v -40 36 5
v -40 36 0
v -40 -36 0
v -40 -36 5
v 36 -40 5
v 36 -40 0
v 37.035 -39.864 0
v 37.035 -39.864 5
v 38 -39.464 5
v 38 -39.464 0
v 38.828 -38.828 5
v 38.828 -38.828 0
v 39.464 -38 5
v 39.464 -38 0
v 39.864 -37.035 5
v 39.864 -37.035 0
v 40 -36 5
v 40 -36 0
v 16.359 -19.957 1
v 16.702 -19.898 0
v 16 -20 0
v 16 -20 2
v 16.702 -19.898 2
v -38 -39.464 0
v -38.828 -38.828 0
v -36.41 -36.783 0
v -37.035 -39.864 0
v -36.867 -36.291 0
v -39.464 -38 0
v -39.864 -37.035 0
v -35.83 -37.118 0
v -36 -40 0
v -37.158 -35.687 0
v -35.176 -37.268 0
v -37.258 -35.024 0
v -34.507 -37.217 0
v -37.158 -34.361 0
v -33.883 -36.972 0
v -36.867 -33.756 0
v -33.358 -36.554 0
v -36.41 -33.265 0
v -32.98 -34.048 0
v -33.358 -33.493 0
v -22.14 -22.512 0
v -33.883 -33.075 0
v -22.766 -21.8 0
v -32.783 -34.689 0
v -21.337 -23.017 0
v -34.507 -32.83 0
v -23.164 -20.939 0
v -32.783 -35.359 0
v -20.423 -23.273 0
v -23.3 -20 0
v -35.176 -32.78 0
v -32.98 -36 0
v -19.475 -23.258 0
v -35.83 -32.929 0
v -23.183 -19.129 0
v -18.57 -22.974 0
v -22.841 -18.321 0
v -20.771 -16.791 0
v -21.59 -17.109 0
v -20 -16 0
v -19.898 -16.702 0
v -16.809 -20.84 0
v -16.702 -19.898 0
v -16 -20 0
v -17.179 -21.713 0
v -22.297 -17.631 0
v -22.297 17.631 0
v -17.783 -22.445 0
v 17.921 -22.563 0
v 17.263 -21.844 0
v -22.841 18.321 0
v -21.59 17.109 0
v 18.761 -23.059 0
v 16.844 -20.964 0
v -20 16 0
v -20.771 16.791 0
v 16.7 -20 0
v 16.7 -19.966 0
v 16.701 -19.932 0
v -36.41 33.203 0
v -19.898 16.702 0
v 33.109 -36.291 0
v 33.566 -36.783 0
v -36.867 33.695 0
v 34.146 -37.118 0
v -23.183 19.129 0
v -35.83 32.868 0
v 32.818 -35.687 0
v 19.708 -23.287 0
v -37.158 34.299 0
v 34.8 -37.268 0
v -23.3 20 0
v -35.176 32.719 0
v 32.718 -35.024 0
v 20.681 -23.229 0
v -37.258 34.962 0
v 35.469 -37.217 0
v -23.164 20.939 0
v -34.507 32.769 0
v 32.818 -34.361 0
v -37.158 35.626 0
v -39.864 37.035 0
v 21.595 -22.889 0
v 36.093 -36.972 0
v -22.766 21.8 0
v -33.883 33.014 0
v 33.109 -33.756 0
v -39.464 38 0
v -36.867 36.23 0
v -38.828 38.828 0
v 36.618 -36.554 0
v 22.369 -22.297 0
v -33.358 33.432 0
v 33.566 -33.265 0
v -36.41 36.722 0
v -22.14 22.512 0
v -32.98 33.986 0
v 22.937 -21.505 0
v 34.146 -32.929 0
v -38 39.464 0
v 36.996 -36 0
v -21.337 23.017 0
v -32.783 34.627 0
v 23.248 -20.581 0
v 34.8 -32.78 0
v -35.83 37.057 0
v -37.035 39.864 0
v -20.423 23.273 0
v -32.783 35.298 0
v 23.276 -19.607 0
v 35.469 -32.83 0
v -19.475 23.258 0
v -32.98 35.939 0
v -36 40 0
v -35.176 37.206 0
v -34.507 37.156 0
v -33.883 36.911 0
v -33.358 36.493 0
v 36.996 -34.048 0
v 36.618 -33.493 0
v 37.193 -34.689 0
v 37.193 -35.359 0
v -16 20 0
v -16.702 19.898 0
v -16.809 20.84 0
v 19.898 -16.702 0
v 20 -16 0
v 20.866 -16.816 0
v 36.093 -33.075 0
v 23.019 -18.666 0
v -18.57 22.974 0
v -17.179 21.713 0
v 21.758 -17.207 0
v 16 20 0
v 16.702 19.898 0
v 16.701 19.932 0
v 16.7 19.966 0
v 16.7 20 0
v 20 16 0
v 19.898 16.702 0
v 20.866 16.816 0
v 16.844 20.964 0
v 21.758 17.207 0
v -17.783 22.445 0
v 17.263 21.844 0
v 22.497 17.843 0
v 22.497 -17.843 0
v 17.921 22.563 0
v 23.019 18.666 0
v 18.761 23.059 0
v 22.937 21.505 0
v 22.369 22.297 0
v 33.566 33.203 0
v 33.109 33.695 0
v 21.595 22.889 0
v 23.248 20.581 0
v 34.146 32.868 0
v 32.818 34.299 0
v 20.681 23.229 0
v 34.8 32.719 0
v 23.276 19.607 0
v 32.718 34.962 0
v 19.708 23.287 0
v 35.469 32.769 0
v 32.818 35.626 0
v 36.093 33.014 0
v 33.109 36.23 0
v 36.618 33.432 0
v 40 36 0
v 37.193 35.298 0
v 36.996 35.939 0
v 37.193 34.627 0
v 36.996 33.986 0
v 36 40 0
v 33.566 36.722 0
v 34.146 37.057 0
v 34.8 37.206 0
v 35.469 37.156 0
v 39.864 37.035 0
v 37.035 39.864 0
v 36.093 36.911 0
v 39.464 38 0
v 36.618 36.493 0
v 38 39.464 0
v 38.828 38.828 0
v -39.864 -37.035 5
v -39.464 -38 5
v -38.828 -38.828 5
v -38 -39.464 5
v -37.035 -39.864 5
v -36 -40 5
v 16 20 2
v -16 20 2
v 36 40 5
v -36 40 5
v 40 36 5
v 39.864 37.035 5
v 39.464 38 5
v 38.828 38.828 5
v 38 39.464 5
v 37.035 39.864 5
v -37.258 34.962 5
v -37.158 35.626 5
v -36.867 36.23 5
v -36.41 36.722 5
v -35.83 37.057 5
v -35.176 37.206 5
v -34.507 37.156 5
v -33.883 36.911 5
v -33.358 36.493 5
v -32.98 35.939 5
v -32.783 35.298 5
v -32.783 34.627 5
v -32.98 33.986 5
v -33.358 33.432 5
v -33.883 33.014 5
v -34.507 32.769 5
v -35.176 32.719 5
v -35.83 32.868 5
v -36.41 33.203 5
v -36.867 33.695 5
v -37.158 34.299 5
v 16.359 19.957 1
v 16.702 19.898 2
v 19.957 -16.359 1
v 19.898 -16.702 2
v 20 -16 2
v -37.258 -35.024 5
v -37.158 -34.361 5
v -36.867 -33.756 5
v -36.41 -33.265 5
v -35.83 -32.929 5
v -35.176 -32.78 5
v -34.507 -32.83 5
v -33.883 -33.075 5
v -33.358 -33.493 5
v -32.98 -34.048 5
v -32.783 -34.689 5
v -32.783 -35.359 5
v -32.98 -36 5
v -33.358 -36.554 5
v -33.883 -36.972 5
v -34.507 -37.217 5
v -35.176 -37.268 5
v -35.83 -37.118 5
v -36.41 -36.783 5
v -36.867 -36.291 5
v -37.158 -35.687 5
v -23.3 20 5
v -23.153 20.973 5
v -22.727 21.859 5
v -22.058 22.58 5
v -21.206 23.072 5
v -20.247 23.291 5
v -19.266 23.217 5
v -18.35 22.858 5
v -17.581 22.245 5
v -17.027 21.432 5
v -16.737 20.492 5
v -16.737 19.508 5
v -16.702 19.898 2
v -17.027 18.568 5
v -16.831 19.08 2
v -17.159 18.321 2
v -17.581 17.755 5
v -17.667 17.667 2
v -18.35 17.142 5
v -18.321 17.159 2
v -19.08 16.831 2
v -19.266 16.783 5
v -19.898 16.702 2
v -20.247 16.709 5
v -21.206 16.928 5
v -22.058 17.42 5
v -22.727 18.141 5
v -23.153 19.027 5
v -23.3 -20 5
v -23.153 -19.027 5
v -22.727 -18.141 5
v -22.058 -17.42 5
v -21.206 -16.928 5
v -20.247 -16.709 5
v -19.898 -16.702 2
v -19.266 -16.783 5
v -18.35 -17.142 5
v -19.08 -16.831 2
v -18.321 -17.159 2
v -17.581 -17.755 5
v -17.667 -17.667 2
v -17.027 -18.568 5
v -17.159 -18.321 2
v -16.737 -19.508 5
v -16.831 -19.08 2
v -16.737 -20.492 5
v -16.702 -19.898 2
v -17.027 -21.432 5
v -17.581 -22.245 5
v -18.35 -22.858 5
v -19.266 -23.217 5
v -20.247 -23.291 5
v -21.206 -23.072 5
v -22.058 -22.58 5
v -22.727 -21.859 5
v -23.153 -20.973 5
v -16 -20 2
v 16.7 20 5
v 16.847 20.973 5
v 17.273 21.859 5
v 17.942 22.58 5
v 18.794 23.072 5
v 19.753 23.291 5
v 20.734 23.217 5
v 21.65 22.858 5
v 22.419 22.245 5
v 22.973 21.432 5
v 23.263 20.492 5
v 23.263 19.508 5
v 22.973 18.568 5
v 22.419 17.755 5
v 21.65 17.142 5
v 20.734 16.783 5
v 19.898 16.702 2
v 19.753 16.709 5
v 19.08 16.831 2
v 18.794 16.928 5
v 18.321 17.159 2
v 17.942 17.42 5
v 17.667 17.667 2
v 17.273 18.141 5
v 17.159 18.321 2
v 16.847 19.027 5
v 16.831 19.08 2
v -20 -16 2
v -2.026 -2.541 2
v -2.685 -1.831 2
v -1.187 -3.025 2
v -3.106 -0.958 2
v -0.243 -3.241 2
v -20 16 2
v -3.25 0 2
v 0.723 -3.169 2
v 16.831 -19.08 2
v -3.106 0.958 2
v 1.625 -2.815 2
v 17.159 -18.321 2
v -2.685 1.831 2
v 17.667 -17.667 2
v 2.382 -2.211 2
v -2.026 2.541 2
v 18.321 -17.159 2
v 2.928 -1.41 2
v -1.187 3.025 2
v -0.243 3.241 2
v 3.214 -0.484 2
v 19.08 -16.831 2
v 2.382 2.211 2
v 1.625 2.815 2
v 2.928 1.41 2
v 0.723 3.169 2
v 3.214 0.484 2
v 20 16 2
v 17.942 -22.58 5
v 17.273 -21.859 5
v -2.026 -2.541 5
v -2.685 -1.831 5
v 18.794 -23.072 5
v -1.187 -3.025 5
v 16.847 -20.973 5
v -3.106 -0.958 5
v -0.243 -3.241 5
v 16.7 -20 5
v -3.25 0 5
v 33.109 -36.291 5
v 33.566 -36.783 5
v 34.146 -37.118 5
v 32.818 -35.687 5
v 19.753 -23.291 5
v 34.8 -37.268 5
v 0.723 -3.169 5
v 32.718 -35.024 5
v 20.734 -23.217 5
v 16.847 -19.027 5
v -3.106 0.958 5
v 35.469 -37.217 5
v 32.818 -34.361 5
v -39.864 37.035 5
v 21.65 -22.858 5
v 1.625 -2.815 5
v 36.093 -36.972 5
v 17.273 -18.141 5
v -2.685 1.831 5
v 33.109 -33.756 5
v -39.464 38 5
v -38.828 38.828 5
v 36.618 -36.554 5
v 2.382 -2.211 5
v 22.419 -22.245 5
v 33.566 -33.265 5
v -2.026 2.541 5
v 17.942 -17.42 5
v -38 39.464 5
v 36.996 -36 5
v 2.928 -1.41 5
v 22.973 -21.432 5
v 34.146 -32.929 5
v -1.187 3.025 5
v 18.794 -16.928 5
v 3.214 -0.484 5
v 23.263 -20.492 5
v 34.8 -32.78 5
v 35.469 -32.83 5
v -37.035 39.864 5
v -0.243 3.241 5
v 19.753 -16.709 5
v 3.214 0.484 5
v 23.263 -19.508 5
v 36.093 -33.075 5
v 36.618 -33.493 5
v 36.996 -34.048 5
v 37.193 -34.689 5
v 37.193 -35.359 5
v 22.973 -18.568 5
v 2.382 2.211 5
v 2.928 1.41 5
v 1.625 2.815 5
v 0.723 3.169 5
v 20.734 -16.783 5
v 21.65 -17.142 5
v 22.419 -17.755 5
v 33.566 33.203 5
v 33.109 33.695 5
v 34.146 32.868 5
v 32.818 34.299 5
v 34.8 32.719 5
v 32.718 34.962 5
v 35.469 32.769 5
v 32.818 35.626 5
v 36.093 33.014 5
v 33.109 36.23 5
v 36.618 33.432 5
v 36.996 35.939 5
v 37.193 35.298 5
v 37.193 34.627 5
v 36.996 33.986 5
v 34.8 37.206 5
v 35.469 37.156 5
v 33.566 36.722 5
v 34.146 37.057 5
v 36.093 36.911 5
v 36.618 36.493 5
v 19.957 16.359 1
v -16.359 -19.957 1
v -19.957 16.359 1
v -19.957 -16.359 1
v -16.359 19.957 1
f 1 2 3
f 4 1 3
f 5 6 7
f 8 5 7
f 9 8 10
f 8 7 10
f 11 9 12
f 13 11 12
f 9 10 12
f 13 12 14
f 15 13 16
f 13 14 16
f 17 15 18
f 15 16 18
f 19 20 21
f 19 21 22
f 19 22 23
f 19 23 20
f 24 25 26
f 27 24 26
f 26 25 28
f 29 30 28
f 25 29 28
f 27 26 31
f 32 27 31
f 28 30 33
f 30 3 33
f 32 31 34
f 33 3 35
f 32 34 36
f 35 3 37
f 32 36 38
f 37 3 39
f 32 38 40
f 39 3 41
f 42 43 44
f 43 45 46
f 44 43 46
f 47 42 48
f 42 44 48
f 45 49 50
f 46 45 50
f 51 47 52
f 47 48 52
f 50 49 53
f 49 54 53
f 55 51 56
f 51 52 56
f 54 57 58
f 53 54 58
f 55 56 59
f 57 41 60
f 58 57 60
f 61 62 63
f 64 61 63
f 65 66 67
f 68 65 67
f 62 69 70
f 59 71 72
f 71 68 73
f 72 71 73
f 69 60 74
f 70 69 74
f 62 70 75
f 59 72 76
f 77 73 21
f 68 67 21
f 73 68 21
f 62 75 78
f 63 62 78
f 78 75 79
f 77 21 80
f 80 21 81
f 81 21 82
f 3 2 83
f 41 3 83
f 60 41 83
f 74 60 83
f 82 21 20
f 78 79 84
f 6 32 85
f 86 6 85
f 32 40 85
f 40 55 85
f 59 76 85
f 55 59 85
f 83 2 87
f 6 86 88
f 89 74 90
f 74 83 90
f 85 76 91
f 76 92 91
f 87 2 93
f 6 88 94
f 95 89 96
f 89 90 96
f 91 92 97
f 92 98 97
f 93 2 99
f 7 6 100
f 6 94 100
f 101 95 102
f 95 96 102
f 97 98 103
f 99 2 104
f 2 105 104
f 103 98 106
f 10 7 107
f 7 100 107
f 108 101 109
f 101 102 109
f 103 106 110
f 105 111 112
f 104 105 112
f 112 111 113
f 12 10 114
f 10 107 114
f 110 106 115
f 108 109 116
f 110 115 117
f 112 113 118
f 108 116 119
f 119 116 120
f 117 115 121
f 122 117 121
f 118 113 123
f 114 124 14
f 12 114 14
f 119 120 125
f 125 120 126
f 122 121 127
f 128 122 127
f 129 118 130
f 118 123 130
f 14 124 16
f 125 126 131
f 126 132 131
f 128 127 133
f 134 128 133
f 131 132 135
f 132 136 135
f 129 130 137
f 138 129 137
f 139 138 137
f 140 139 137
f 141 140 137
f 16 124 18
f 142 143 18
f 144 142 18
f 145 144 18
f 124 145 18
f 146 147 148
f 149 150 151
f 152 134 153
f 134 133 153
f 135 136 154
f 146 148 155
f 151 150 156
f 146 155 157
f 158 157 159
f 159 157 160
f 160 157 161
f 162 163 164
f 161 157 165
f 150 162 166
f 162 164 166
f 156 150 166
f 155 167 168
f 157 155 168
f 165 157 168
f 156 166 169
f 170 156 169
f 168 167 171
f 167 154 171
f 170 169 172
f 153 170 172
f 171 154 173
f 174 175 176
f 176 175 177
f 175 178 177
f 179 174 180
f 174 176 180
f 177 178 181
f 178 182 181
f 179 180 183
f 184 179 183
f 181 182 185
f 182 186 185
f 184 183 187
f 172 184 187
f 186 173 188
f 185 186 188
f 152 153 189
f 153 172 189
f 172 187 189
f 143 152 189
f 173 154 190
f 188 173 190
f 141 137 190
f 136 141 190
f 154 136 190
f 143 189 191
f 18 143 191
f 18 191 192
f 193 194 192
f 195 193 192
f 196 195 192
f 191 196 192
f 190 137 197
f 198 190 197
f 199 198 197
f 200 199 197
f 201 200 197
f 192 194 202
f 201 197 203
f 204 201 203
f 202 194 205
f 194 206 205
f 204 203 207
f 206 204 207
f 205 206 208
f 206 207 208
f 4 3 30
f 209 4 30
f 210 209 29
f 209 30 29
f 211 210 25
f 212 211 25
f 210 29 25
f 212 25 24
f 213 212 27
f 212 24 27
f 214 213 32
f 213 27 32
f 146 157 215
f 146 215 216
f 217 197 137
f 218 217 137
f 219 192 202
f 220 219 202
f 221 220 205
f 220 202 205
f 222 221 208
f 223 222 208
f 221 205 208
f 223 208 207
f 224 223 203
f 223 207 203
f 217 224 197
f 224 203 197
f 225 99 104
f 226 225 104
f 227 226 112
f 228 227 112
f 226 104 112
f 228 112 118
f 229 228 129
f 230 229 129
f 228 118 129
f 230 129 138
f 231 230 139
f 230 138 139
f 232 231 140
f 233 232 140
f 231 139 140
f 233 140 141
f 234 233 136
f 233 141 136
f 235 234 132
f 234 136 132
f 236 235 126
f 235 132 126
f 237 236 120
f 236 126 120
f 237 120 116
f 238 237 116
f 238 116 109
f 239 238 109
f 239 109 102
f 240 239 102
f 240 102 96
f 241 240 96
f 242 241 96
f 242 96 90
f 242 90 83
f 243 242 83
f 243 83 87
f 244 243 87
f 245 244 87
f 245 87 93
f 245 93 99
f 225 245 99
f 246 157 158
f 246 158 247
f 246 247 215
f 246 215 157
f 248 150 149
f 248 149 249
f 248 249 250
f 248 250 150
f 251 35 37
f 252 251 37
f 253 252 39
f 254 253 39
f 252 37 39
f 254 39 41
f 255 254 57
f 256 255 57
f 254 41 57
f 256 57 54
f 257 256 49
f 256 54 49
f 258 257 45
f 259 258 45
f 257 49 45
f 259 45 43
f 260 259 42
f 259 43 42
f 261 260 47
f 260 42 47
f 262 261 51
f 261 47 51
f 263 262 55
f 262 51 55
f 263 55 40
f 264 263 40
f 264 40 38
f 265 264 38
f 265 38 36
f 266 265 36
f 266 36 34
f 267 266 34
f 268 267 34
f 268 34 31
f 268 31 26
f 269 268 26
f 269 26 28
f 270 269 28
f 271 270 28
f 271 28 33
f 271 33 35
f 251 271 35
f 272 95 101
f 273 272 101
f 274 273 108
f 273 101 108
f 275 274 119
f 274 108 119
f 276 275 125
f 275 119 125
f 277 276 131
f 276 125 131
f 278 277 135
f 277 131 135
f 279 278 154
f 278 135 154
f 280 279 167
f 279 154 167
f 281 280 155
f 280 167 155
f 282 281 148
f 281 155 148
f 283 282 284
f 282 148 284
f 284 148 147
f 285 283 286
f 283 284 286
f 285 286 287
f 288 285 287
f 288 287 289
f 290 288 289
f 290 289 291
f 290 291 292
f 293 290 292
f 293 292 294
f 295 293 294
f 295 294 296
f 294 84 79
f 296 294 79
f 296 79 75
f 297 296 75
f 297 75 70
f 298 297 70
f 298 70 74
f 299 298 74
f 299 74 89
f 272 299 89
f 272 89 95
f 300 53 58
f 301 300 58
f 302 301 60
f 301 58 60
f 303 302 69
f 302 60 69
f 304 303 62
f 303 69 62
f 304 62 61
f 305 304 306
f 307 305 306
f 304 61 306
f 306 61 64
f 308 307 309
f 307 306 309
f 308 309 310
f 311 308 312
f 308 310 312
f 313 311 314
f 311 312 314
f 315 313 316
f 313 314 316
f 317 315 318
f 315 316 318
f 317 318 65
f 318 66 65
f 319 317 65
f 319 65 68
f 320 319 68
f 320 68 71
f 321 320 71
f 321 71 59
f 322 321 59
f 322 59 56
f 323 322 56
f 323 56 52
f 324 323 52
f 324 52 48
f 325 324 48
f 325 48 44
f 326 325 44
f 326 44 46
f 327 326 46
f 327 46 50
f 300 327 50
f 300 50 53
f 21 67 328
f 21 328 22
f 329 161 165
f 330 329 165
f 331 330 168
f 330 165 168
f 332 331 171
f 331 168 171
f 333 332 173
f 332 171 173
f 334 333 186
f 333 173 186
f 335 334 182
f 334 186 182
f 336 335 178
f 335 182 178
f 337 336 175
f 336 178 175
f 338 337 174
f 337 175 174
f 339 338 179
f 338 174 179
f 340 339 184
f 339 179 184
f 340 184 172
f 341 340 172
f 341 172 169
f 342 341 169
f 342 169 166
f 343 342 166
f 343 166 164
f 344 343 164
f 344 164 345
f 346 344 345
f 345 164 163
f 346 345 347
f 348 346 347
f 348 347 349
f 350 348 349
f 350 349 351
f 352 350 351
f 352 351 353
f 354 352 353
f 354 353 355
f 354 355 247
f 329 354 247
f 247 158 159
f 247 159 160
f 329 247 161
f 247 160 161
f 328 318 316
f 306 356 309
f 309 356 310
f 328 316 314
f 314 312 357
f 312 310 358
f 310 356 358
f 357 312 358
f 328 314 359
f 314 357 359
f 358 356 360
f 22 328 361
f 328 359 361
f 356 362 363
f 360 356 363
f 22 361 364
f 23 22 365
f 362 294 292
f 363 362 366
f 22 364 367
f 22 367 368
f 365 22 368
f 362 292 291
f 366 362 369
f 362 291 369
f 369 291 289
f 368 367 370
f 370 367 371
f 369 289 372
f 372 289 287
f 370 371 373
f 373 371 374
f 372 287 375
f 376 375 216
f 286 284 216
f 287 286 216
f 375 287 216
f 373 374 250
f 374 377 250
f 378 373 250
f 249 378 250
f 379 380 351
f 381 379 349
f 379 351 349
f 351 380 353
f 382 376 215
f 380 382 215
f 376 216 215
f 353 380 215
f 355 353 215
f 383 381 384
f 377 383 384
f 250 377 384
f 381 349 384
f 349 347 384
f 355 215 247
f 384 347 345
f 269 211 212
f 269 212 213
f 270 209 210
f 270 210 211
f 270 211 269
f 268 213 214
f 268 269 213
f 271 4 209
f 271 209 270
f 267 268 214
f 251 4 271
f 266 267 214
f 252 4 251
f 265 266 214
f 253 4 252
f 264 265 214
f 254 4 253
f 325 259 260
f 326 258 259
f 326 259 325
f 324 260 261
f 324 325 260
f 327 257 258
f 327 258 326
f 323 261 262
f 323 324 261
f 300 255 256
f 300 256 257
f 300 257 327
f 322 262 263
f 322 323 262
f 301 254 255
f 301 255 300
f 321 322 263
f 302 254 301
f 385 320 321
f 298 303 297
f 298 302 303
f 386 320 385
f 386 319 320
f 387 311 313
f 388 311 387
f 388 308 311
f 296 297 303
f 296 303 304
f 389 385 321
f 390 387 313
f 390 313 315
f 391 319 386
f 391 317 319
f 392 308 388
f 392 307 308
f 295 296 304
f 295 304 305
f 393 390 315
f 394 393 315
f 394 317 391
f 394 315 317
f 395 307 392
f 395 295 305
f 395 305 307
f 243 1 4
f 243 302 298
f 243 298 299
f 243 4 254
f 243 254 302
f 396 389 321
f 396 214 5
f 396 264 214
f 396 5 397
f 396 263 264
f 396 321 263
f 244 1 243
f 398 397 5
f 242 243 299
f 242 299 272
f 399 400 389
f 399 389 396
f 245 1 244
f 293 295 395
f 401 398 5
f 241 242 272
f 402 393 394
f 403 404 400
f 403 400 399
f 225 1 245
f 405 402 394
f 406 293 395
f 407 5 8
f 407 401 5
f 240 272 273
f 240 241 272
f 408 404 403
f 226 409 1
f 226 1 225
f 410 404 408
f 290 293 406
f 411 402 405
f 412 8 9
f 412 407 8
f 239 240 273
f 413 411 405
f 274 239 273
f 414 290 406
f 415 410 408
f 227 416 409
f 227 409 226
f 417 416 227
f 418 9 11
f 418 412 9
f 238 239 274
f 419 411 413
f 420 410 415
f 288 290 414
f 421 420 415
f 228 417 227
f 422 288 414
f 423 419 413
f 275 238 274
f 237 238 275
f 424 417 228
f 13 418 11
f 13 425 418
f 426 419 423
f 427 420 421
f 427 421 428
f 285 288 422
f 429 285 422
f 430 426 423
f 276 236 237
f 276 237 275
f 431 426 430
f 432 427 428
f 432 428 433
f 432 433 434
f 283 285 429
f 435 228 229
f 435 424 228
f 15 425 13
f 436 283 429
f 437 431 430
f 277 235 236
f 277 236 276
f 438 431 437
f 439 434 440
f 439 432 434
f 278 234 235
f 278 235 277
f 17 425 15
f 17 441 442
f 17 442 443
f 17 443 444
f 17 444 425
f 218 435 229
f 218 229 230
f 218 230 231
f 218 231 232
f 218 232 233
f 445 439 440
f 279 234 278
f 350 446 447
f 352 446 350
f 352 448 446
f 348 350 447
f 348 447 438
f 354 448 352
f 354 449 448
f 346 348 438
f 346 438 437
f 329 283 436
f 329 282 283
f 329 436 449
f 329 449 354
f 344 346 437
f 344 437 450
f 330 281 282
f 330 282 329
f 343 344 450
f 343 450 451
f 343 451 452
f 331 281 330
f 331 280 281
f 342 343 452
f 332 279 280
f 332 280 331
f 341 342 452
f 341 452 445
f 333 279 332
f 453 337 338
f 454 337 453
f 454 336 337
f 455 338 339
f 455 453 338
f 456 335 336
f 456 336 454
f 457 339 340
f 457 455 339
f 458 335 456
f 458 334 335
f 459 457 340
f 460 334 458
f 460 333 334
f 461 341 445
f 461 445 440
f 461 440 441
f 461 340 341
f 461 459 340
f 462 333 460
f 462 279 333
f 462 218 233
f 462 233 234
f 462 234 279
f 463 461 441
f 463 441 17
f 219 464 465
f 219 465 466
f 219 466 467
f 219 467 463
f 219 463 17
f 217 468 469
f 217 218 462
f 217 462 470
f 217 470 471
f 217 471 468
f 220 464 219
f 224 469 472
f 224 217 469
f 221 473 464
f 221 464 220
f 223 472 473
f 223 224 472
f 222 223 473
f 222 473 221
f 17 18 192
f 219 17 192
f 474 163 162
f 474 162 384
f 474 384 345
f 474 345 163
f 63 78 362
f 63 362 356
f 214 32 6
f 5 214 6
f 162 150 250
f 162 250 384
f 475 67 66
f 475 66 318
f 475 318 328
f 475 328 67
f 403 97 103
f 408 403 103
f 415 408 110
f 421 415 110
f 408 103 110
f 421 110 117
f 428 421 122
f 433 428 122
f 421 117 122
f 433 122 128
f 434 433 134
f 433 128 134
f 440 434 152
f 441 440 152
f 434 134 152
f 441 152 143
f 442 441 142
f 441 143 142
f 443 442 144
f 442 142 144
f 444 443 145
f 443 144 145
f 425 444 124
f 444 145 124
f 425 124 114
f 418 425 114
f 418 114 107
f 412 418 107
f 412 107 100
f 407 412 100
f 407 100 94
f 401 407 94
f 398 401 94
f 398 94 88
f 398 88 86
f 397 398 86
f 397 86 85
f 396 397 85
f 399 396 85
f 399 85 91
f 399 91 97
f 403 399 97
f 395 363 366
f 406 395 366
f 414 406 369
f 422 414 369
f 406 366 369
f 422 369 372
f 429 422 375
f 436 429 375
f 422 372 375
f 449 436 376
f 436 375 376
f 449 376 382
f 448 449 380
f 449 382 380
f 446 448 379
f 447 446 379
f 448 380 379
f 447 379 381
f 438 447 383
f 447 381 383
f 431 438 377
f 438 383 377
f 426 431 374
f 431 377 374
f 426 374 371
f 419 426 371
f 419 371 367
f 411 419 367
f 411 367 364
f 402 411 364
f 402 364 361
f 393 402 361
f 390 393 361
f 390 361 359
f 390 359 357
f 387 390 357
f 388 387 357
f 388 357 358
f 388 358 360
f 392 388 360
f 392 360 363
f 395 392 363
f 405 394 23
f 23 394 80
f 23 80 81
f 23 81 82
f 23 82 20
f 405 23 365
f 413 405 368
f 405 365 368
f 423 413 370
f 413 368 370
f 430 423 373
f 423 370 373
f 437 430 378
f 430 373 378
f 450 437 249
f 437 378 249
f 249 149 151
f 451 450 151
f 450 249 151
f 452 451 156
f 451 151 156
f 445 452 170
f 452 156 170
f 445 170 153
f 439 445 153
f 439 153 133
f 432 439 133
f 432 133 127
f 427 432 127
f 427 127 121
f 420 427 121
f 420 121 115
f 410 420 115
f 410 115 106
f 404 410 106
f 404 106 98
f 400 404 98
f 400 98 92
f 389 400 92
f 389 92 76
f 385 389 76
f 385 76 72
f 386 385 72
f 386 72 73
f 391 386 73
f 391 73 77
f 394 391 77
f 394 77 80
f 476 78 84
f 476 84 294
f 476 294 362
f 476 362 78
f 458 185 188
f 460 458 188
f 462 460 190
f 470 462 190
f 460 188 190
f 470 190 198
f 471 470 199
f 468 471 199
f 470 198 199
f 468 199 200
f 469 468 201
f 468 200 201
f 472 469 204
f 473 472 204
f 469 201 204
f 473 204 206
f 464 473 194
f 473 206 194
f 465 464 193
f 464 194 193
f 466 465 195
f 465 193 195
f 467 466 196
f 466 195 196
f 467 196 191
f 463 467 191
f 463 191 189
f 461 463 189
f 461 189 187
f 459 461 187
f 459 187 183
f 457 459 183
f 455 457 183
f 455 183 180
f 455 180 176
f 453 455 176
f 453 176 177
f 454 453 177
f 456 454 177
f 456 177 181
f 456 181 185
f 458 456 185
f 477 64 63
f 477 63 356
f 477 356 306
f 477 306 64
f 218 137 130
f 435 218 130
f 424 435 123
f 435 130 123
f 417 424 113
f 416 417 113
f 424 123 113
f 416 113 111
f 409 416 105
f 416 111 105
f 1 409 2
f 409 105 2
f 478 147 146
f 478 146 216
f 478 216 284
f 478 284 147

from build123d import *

# Parameters (mm, degrees)
BOSS_EXTRU_1_DEPTH      = 5
D_GAGEMENT_M41_D        = 4.5
ESQUISSE4_R             = 3.25
ENL_V_MAT_EXTRU_1_DEPTH = 57.789083458
D_GAGEMENT_M61_D        = 6.6
ENL_V_MAT_EXTRU_2_DEPTH = 2


with BuildPart() as part:
    # Esquisse1 → Boss.-Extru.1 (new body)
    with BuildSketch(Plane.XY):
        with BuildLine():
            Line((-36, -40), (36, -40))
            ThreePointArc((36, -40), (38.828427125, -38.828427125), (40, -36))
            Line((40, -36), (40, 36))
            ThreePointArc((40, 36), (38.828427125, 38.828427125), (36, 40))
            Line((36, 40), (-36, 40))
            ThreePointArc((-36, 40), (-38.828427125, 38.828427125), (-40, 36))
            Line((-40, 36), (-40, -36))
            ThreePointArc((-40, -36), (-38.828427125, -38.828427125), (-36, -40))
        make_face()
    extrude(amount=BOSS_EXTRU_1_DEPTH)

    # Dégagement M41 (through all)
    with Locations(Plane.XY.offset(5)):
        with Locations((-35.007622699, 34.962380164), (34.968353645, 34.962380164), (34.968353645, -35.023881333), (-35.007622699, -35.023881333)):
            Hole(D_GAGEMENT_M41_D / 2)

    # Esquisse4 → Enlèv. mat.-Extru.1 (cut, through all)
    with BuildSketch(Plane(origin=(0, 0, 0), x_dir=(-1, 0, 0), z_dir=(0, 0, -1))):
        Circle(ESQUISSE4_R)
    extrude(amount=-ENL_V_MAT_EXTRU_1_DEPTH, mode=Mode.SUBTRACT)

    # Dégagement M61 (through all)
    with Locations(Plane.XY.offset(5)):
        with Locations((-20, 20), (20, 20), (20, -20), (-20, -20)):
            Hole(D_GAGEMENT_M61_D / 2)

    # Esquisse7 → Enlèv. mat.-Extru.2 (cut)
    with BuildSketch(Plane(origin=(0, 0, 0), x_dir=(-1, 0, 0), z_dir=(0, 0, -1))):
        with BuildLine():
            Line((-16, 20), (16, 20))
            add(Edge.make_bspline(
                [(16, 20), (19.65685425, 19.656854249), (20, 16)],
                knots=[0, 0, 0, 1, 1, 1], degree=2))
            Line((20, 16), (20, -16))
            add(Edge.make_bspline(
                [(20, -16), (19.65685425, -19.65685425), (16, -20)],
                knots=[0, 0, 0, 1, 1, 1], degree=2))
            Line((16, -20), (-16, -20))
            add(Edge.make_bspline(
                [(-16, -20), (-19.656854249, -19.65685425), (-20, -16)],
                knots=[0, 0, 0, 1, 1, 1], degree=2))
            Line((-20, -16), (-20, 16))
            add(Edge.make_bspline(
                [(-20, 16), (-19.656854249, 19.656854249), (-16, 20)],
                knots=[0, 0, 0, 1, 1, 1], degree=2))
        make_face()
    extrude(amount=-ENL_V_MAT_EXTRU_2_DEPTH, mode=Mode.SUBTRACT)


solid = part.part
